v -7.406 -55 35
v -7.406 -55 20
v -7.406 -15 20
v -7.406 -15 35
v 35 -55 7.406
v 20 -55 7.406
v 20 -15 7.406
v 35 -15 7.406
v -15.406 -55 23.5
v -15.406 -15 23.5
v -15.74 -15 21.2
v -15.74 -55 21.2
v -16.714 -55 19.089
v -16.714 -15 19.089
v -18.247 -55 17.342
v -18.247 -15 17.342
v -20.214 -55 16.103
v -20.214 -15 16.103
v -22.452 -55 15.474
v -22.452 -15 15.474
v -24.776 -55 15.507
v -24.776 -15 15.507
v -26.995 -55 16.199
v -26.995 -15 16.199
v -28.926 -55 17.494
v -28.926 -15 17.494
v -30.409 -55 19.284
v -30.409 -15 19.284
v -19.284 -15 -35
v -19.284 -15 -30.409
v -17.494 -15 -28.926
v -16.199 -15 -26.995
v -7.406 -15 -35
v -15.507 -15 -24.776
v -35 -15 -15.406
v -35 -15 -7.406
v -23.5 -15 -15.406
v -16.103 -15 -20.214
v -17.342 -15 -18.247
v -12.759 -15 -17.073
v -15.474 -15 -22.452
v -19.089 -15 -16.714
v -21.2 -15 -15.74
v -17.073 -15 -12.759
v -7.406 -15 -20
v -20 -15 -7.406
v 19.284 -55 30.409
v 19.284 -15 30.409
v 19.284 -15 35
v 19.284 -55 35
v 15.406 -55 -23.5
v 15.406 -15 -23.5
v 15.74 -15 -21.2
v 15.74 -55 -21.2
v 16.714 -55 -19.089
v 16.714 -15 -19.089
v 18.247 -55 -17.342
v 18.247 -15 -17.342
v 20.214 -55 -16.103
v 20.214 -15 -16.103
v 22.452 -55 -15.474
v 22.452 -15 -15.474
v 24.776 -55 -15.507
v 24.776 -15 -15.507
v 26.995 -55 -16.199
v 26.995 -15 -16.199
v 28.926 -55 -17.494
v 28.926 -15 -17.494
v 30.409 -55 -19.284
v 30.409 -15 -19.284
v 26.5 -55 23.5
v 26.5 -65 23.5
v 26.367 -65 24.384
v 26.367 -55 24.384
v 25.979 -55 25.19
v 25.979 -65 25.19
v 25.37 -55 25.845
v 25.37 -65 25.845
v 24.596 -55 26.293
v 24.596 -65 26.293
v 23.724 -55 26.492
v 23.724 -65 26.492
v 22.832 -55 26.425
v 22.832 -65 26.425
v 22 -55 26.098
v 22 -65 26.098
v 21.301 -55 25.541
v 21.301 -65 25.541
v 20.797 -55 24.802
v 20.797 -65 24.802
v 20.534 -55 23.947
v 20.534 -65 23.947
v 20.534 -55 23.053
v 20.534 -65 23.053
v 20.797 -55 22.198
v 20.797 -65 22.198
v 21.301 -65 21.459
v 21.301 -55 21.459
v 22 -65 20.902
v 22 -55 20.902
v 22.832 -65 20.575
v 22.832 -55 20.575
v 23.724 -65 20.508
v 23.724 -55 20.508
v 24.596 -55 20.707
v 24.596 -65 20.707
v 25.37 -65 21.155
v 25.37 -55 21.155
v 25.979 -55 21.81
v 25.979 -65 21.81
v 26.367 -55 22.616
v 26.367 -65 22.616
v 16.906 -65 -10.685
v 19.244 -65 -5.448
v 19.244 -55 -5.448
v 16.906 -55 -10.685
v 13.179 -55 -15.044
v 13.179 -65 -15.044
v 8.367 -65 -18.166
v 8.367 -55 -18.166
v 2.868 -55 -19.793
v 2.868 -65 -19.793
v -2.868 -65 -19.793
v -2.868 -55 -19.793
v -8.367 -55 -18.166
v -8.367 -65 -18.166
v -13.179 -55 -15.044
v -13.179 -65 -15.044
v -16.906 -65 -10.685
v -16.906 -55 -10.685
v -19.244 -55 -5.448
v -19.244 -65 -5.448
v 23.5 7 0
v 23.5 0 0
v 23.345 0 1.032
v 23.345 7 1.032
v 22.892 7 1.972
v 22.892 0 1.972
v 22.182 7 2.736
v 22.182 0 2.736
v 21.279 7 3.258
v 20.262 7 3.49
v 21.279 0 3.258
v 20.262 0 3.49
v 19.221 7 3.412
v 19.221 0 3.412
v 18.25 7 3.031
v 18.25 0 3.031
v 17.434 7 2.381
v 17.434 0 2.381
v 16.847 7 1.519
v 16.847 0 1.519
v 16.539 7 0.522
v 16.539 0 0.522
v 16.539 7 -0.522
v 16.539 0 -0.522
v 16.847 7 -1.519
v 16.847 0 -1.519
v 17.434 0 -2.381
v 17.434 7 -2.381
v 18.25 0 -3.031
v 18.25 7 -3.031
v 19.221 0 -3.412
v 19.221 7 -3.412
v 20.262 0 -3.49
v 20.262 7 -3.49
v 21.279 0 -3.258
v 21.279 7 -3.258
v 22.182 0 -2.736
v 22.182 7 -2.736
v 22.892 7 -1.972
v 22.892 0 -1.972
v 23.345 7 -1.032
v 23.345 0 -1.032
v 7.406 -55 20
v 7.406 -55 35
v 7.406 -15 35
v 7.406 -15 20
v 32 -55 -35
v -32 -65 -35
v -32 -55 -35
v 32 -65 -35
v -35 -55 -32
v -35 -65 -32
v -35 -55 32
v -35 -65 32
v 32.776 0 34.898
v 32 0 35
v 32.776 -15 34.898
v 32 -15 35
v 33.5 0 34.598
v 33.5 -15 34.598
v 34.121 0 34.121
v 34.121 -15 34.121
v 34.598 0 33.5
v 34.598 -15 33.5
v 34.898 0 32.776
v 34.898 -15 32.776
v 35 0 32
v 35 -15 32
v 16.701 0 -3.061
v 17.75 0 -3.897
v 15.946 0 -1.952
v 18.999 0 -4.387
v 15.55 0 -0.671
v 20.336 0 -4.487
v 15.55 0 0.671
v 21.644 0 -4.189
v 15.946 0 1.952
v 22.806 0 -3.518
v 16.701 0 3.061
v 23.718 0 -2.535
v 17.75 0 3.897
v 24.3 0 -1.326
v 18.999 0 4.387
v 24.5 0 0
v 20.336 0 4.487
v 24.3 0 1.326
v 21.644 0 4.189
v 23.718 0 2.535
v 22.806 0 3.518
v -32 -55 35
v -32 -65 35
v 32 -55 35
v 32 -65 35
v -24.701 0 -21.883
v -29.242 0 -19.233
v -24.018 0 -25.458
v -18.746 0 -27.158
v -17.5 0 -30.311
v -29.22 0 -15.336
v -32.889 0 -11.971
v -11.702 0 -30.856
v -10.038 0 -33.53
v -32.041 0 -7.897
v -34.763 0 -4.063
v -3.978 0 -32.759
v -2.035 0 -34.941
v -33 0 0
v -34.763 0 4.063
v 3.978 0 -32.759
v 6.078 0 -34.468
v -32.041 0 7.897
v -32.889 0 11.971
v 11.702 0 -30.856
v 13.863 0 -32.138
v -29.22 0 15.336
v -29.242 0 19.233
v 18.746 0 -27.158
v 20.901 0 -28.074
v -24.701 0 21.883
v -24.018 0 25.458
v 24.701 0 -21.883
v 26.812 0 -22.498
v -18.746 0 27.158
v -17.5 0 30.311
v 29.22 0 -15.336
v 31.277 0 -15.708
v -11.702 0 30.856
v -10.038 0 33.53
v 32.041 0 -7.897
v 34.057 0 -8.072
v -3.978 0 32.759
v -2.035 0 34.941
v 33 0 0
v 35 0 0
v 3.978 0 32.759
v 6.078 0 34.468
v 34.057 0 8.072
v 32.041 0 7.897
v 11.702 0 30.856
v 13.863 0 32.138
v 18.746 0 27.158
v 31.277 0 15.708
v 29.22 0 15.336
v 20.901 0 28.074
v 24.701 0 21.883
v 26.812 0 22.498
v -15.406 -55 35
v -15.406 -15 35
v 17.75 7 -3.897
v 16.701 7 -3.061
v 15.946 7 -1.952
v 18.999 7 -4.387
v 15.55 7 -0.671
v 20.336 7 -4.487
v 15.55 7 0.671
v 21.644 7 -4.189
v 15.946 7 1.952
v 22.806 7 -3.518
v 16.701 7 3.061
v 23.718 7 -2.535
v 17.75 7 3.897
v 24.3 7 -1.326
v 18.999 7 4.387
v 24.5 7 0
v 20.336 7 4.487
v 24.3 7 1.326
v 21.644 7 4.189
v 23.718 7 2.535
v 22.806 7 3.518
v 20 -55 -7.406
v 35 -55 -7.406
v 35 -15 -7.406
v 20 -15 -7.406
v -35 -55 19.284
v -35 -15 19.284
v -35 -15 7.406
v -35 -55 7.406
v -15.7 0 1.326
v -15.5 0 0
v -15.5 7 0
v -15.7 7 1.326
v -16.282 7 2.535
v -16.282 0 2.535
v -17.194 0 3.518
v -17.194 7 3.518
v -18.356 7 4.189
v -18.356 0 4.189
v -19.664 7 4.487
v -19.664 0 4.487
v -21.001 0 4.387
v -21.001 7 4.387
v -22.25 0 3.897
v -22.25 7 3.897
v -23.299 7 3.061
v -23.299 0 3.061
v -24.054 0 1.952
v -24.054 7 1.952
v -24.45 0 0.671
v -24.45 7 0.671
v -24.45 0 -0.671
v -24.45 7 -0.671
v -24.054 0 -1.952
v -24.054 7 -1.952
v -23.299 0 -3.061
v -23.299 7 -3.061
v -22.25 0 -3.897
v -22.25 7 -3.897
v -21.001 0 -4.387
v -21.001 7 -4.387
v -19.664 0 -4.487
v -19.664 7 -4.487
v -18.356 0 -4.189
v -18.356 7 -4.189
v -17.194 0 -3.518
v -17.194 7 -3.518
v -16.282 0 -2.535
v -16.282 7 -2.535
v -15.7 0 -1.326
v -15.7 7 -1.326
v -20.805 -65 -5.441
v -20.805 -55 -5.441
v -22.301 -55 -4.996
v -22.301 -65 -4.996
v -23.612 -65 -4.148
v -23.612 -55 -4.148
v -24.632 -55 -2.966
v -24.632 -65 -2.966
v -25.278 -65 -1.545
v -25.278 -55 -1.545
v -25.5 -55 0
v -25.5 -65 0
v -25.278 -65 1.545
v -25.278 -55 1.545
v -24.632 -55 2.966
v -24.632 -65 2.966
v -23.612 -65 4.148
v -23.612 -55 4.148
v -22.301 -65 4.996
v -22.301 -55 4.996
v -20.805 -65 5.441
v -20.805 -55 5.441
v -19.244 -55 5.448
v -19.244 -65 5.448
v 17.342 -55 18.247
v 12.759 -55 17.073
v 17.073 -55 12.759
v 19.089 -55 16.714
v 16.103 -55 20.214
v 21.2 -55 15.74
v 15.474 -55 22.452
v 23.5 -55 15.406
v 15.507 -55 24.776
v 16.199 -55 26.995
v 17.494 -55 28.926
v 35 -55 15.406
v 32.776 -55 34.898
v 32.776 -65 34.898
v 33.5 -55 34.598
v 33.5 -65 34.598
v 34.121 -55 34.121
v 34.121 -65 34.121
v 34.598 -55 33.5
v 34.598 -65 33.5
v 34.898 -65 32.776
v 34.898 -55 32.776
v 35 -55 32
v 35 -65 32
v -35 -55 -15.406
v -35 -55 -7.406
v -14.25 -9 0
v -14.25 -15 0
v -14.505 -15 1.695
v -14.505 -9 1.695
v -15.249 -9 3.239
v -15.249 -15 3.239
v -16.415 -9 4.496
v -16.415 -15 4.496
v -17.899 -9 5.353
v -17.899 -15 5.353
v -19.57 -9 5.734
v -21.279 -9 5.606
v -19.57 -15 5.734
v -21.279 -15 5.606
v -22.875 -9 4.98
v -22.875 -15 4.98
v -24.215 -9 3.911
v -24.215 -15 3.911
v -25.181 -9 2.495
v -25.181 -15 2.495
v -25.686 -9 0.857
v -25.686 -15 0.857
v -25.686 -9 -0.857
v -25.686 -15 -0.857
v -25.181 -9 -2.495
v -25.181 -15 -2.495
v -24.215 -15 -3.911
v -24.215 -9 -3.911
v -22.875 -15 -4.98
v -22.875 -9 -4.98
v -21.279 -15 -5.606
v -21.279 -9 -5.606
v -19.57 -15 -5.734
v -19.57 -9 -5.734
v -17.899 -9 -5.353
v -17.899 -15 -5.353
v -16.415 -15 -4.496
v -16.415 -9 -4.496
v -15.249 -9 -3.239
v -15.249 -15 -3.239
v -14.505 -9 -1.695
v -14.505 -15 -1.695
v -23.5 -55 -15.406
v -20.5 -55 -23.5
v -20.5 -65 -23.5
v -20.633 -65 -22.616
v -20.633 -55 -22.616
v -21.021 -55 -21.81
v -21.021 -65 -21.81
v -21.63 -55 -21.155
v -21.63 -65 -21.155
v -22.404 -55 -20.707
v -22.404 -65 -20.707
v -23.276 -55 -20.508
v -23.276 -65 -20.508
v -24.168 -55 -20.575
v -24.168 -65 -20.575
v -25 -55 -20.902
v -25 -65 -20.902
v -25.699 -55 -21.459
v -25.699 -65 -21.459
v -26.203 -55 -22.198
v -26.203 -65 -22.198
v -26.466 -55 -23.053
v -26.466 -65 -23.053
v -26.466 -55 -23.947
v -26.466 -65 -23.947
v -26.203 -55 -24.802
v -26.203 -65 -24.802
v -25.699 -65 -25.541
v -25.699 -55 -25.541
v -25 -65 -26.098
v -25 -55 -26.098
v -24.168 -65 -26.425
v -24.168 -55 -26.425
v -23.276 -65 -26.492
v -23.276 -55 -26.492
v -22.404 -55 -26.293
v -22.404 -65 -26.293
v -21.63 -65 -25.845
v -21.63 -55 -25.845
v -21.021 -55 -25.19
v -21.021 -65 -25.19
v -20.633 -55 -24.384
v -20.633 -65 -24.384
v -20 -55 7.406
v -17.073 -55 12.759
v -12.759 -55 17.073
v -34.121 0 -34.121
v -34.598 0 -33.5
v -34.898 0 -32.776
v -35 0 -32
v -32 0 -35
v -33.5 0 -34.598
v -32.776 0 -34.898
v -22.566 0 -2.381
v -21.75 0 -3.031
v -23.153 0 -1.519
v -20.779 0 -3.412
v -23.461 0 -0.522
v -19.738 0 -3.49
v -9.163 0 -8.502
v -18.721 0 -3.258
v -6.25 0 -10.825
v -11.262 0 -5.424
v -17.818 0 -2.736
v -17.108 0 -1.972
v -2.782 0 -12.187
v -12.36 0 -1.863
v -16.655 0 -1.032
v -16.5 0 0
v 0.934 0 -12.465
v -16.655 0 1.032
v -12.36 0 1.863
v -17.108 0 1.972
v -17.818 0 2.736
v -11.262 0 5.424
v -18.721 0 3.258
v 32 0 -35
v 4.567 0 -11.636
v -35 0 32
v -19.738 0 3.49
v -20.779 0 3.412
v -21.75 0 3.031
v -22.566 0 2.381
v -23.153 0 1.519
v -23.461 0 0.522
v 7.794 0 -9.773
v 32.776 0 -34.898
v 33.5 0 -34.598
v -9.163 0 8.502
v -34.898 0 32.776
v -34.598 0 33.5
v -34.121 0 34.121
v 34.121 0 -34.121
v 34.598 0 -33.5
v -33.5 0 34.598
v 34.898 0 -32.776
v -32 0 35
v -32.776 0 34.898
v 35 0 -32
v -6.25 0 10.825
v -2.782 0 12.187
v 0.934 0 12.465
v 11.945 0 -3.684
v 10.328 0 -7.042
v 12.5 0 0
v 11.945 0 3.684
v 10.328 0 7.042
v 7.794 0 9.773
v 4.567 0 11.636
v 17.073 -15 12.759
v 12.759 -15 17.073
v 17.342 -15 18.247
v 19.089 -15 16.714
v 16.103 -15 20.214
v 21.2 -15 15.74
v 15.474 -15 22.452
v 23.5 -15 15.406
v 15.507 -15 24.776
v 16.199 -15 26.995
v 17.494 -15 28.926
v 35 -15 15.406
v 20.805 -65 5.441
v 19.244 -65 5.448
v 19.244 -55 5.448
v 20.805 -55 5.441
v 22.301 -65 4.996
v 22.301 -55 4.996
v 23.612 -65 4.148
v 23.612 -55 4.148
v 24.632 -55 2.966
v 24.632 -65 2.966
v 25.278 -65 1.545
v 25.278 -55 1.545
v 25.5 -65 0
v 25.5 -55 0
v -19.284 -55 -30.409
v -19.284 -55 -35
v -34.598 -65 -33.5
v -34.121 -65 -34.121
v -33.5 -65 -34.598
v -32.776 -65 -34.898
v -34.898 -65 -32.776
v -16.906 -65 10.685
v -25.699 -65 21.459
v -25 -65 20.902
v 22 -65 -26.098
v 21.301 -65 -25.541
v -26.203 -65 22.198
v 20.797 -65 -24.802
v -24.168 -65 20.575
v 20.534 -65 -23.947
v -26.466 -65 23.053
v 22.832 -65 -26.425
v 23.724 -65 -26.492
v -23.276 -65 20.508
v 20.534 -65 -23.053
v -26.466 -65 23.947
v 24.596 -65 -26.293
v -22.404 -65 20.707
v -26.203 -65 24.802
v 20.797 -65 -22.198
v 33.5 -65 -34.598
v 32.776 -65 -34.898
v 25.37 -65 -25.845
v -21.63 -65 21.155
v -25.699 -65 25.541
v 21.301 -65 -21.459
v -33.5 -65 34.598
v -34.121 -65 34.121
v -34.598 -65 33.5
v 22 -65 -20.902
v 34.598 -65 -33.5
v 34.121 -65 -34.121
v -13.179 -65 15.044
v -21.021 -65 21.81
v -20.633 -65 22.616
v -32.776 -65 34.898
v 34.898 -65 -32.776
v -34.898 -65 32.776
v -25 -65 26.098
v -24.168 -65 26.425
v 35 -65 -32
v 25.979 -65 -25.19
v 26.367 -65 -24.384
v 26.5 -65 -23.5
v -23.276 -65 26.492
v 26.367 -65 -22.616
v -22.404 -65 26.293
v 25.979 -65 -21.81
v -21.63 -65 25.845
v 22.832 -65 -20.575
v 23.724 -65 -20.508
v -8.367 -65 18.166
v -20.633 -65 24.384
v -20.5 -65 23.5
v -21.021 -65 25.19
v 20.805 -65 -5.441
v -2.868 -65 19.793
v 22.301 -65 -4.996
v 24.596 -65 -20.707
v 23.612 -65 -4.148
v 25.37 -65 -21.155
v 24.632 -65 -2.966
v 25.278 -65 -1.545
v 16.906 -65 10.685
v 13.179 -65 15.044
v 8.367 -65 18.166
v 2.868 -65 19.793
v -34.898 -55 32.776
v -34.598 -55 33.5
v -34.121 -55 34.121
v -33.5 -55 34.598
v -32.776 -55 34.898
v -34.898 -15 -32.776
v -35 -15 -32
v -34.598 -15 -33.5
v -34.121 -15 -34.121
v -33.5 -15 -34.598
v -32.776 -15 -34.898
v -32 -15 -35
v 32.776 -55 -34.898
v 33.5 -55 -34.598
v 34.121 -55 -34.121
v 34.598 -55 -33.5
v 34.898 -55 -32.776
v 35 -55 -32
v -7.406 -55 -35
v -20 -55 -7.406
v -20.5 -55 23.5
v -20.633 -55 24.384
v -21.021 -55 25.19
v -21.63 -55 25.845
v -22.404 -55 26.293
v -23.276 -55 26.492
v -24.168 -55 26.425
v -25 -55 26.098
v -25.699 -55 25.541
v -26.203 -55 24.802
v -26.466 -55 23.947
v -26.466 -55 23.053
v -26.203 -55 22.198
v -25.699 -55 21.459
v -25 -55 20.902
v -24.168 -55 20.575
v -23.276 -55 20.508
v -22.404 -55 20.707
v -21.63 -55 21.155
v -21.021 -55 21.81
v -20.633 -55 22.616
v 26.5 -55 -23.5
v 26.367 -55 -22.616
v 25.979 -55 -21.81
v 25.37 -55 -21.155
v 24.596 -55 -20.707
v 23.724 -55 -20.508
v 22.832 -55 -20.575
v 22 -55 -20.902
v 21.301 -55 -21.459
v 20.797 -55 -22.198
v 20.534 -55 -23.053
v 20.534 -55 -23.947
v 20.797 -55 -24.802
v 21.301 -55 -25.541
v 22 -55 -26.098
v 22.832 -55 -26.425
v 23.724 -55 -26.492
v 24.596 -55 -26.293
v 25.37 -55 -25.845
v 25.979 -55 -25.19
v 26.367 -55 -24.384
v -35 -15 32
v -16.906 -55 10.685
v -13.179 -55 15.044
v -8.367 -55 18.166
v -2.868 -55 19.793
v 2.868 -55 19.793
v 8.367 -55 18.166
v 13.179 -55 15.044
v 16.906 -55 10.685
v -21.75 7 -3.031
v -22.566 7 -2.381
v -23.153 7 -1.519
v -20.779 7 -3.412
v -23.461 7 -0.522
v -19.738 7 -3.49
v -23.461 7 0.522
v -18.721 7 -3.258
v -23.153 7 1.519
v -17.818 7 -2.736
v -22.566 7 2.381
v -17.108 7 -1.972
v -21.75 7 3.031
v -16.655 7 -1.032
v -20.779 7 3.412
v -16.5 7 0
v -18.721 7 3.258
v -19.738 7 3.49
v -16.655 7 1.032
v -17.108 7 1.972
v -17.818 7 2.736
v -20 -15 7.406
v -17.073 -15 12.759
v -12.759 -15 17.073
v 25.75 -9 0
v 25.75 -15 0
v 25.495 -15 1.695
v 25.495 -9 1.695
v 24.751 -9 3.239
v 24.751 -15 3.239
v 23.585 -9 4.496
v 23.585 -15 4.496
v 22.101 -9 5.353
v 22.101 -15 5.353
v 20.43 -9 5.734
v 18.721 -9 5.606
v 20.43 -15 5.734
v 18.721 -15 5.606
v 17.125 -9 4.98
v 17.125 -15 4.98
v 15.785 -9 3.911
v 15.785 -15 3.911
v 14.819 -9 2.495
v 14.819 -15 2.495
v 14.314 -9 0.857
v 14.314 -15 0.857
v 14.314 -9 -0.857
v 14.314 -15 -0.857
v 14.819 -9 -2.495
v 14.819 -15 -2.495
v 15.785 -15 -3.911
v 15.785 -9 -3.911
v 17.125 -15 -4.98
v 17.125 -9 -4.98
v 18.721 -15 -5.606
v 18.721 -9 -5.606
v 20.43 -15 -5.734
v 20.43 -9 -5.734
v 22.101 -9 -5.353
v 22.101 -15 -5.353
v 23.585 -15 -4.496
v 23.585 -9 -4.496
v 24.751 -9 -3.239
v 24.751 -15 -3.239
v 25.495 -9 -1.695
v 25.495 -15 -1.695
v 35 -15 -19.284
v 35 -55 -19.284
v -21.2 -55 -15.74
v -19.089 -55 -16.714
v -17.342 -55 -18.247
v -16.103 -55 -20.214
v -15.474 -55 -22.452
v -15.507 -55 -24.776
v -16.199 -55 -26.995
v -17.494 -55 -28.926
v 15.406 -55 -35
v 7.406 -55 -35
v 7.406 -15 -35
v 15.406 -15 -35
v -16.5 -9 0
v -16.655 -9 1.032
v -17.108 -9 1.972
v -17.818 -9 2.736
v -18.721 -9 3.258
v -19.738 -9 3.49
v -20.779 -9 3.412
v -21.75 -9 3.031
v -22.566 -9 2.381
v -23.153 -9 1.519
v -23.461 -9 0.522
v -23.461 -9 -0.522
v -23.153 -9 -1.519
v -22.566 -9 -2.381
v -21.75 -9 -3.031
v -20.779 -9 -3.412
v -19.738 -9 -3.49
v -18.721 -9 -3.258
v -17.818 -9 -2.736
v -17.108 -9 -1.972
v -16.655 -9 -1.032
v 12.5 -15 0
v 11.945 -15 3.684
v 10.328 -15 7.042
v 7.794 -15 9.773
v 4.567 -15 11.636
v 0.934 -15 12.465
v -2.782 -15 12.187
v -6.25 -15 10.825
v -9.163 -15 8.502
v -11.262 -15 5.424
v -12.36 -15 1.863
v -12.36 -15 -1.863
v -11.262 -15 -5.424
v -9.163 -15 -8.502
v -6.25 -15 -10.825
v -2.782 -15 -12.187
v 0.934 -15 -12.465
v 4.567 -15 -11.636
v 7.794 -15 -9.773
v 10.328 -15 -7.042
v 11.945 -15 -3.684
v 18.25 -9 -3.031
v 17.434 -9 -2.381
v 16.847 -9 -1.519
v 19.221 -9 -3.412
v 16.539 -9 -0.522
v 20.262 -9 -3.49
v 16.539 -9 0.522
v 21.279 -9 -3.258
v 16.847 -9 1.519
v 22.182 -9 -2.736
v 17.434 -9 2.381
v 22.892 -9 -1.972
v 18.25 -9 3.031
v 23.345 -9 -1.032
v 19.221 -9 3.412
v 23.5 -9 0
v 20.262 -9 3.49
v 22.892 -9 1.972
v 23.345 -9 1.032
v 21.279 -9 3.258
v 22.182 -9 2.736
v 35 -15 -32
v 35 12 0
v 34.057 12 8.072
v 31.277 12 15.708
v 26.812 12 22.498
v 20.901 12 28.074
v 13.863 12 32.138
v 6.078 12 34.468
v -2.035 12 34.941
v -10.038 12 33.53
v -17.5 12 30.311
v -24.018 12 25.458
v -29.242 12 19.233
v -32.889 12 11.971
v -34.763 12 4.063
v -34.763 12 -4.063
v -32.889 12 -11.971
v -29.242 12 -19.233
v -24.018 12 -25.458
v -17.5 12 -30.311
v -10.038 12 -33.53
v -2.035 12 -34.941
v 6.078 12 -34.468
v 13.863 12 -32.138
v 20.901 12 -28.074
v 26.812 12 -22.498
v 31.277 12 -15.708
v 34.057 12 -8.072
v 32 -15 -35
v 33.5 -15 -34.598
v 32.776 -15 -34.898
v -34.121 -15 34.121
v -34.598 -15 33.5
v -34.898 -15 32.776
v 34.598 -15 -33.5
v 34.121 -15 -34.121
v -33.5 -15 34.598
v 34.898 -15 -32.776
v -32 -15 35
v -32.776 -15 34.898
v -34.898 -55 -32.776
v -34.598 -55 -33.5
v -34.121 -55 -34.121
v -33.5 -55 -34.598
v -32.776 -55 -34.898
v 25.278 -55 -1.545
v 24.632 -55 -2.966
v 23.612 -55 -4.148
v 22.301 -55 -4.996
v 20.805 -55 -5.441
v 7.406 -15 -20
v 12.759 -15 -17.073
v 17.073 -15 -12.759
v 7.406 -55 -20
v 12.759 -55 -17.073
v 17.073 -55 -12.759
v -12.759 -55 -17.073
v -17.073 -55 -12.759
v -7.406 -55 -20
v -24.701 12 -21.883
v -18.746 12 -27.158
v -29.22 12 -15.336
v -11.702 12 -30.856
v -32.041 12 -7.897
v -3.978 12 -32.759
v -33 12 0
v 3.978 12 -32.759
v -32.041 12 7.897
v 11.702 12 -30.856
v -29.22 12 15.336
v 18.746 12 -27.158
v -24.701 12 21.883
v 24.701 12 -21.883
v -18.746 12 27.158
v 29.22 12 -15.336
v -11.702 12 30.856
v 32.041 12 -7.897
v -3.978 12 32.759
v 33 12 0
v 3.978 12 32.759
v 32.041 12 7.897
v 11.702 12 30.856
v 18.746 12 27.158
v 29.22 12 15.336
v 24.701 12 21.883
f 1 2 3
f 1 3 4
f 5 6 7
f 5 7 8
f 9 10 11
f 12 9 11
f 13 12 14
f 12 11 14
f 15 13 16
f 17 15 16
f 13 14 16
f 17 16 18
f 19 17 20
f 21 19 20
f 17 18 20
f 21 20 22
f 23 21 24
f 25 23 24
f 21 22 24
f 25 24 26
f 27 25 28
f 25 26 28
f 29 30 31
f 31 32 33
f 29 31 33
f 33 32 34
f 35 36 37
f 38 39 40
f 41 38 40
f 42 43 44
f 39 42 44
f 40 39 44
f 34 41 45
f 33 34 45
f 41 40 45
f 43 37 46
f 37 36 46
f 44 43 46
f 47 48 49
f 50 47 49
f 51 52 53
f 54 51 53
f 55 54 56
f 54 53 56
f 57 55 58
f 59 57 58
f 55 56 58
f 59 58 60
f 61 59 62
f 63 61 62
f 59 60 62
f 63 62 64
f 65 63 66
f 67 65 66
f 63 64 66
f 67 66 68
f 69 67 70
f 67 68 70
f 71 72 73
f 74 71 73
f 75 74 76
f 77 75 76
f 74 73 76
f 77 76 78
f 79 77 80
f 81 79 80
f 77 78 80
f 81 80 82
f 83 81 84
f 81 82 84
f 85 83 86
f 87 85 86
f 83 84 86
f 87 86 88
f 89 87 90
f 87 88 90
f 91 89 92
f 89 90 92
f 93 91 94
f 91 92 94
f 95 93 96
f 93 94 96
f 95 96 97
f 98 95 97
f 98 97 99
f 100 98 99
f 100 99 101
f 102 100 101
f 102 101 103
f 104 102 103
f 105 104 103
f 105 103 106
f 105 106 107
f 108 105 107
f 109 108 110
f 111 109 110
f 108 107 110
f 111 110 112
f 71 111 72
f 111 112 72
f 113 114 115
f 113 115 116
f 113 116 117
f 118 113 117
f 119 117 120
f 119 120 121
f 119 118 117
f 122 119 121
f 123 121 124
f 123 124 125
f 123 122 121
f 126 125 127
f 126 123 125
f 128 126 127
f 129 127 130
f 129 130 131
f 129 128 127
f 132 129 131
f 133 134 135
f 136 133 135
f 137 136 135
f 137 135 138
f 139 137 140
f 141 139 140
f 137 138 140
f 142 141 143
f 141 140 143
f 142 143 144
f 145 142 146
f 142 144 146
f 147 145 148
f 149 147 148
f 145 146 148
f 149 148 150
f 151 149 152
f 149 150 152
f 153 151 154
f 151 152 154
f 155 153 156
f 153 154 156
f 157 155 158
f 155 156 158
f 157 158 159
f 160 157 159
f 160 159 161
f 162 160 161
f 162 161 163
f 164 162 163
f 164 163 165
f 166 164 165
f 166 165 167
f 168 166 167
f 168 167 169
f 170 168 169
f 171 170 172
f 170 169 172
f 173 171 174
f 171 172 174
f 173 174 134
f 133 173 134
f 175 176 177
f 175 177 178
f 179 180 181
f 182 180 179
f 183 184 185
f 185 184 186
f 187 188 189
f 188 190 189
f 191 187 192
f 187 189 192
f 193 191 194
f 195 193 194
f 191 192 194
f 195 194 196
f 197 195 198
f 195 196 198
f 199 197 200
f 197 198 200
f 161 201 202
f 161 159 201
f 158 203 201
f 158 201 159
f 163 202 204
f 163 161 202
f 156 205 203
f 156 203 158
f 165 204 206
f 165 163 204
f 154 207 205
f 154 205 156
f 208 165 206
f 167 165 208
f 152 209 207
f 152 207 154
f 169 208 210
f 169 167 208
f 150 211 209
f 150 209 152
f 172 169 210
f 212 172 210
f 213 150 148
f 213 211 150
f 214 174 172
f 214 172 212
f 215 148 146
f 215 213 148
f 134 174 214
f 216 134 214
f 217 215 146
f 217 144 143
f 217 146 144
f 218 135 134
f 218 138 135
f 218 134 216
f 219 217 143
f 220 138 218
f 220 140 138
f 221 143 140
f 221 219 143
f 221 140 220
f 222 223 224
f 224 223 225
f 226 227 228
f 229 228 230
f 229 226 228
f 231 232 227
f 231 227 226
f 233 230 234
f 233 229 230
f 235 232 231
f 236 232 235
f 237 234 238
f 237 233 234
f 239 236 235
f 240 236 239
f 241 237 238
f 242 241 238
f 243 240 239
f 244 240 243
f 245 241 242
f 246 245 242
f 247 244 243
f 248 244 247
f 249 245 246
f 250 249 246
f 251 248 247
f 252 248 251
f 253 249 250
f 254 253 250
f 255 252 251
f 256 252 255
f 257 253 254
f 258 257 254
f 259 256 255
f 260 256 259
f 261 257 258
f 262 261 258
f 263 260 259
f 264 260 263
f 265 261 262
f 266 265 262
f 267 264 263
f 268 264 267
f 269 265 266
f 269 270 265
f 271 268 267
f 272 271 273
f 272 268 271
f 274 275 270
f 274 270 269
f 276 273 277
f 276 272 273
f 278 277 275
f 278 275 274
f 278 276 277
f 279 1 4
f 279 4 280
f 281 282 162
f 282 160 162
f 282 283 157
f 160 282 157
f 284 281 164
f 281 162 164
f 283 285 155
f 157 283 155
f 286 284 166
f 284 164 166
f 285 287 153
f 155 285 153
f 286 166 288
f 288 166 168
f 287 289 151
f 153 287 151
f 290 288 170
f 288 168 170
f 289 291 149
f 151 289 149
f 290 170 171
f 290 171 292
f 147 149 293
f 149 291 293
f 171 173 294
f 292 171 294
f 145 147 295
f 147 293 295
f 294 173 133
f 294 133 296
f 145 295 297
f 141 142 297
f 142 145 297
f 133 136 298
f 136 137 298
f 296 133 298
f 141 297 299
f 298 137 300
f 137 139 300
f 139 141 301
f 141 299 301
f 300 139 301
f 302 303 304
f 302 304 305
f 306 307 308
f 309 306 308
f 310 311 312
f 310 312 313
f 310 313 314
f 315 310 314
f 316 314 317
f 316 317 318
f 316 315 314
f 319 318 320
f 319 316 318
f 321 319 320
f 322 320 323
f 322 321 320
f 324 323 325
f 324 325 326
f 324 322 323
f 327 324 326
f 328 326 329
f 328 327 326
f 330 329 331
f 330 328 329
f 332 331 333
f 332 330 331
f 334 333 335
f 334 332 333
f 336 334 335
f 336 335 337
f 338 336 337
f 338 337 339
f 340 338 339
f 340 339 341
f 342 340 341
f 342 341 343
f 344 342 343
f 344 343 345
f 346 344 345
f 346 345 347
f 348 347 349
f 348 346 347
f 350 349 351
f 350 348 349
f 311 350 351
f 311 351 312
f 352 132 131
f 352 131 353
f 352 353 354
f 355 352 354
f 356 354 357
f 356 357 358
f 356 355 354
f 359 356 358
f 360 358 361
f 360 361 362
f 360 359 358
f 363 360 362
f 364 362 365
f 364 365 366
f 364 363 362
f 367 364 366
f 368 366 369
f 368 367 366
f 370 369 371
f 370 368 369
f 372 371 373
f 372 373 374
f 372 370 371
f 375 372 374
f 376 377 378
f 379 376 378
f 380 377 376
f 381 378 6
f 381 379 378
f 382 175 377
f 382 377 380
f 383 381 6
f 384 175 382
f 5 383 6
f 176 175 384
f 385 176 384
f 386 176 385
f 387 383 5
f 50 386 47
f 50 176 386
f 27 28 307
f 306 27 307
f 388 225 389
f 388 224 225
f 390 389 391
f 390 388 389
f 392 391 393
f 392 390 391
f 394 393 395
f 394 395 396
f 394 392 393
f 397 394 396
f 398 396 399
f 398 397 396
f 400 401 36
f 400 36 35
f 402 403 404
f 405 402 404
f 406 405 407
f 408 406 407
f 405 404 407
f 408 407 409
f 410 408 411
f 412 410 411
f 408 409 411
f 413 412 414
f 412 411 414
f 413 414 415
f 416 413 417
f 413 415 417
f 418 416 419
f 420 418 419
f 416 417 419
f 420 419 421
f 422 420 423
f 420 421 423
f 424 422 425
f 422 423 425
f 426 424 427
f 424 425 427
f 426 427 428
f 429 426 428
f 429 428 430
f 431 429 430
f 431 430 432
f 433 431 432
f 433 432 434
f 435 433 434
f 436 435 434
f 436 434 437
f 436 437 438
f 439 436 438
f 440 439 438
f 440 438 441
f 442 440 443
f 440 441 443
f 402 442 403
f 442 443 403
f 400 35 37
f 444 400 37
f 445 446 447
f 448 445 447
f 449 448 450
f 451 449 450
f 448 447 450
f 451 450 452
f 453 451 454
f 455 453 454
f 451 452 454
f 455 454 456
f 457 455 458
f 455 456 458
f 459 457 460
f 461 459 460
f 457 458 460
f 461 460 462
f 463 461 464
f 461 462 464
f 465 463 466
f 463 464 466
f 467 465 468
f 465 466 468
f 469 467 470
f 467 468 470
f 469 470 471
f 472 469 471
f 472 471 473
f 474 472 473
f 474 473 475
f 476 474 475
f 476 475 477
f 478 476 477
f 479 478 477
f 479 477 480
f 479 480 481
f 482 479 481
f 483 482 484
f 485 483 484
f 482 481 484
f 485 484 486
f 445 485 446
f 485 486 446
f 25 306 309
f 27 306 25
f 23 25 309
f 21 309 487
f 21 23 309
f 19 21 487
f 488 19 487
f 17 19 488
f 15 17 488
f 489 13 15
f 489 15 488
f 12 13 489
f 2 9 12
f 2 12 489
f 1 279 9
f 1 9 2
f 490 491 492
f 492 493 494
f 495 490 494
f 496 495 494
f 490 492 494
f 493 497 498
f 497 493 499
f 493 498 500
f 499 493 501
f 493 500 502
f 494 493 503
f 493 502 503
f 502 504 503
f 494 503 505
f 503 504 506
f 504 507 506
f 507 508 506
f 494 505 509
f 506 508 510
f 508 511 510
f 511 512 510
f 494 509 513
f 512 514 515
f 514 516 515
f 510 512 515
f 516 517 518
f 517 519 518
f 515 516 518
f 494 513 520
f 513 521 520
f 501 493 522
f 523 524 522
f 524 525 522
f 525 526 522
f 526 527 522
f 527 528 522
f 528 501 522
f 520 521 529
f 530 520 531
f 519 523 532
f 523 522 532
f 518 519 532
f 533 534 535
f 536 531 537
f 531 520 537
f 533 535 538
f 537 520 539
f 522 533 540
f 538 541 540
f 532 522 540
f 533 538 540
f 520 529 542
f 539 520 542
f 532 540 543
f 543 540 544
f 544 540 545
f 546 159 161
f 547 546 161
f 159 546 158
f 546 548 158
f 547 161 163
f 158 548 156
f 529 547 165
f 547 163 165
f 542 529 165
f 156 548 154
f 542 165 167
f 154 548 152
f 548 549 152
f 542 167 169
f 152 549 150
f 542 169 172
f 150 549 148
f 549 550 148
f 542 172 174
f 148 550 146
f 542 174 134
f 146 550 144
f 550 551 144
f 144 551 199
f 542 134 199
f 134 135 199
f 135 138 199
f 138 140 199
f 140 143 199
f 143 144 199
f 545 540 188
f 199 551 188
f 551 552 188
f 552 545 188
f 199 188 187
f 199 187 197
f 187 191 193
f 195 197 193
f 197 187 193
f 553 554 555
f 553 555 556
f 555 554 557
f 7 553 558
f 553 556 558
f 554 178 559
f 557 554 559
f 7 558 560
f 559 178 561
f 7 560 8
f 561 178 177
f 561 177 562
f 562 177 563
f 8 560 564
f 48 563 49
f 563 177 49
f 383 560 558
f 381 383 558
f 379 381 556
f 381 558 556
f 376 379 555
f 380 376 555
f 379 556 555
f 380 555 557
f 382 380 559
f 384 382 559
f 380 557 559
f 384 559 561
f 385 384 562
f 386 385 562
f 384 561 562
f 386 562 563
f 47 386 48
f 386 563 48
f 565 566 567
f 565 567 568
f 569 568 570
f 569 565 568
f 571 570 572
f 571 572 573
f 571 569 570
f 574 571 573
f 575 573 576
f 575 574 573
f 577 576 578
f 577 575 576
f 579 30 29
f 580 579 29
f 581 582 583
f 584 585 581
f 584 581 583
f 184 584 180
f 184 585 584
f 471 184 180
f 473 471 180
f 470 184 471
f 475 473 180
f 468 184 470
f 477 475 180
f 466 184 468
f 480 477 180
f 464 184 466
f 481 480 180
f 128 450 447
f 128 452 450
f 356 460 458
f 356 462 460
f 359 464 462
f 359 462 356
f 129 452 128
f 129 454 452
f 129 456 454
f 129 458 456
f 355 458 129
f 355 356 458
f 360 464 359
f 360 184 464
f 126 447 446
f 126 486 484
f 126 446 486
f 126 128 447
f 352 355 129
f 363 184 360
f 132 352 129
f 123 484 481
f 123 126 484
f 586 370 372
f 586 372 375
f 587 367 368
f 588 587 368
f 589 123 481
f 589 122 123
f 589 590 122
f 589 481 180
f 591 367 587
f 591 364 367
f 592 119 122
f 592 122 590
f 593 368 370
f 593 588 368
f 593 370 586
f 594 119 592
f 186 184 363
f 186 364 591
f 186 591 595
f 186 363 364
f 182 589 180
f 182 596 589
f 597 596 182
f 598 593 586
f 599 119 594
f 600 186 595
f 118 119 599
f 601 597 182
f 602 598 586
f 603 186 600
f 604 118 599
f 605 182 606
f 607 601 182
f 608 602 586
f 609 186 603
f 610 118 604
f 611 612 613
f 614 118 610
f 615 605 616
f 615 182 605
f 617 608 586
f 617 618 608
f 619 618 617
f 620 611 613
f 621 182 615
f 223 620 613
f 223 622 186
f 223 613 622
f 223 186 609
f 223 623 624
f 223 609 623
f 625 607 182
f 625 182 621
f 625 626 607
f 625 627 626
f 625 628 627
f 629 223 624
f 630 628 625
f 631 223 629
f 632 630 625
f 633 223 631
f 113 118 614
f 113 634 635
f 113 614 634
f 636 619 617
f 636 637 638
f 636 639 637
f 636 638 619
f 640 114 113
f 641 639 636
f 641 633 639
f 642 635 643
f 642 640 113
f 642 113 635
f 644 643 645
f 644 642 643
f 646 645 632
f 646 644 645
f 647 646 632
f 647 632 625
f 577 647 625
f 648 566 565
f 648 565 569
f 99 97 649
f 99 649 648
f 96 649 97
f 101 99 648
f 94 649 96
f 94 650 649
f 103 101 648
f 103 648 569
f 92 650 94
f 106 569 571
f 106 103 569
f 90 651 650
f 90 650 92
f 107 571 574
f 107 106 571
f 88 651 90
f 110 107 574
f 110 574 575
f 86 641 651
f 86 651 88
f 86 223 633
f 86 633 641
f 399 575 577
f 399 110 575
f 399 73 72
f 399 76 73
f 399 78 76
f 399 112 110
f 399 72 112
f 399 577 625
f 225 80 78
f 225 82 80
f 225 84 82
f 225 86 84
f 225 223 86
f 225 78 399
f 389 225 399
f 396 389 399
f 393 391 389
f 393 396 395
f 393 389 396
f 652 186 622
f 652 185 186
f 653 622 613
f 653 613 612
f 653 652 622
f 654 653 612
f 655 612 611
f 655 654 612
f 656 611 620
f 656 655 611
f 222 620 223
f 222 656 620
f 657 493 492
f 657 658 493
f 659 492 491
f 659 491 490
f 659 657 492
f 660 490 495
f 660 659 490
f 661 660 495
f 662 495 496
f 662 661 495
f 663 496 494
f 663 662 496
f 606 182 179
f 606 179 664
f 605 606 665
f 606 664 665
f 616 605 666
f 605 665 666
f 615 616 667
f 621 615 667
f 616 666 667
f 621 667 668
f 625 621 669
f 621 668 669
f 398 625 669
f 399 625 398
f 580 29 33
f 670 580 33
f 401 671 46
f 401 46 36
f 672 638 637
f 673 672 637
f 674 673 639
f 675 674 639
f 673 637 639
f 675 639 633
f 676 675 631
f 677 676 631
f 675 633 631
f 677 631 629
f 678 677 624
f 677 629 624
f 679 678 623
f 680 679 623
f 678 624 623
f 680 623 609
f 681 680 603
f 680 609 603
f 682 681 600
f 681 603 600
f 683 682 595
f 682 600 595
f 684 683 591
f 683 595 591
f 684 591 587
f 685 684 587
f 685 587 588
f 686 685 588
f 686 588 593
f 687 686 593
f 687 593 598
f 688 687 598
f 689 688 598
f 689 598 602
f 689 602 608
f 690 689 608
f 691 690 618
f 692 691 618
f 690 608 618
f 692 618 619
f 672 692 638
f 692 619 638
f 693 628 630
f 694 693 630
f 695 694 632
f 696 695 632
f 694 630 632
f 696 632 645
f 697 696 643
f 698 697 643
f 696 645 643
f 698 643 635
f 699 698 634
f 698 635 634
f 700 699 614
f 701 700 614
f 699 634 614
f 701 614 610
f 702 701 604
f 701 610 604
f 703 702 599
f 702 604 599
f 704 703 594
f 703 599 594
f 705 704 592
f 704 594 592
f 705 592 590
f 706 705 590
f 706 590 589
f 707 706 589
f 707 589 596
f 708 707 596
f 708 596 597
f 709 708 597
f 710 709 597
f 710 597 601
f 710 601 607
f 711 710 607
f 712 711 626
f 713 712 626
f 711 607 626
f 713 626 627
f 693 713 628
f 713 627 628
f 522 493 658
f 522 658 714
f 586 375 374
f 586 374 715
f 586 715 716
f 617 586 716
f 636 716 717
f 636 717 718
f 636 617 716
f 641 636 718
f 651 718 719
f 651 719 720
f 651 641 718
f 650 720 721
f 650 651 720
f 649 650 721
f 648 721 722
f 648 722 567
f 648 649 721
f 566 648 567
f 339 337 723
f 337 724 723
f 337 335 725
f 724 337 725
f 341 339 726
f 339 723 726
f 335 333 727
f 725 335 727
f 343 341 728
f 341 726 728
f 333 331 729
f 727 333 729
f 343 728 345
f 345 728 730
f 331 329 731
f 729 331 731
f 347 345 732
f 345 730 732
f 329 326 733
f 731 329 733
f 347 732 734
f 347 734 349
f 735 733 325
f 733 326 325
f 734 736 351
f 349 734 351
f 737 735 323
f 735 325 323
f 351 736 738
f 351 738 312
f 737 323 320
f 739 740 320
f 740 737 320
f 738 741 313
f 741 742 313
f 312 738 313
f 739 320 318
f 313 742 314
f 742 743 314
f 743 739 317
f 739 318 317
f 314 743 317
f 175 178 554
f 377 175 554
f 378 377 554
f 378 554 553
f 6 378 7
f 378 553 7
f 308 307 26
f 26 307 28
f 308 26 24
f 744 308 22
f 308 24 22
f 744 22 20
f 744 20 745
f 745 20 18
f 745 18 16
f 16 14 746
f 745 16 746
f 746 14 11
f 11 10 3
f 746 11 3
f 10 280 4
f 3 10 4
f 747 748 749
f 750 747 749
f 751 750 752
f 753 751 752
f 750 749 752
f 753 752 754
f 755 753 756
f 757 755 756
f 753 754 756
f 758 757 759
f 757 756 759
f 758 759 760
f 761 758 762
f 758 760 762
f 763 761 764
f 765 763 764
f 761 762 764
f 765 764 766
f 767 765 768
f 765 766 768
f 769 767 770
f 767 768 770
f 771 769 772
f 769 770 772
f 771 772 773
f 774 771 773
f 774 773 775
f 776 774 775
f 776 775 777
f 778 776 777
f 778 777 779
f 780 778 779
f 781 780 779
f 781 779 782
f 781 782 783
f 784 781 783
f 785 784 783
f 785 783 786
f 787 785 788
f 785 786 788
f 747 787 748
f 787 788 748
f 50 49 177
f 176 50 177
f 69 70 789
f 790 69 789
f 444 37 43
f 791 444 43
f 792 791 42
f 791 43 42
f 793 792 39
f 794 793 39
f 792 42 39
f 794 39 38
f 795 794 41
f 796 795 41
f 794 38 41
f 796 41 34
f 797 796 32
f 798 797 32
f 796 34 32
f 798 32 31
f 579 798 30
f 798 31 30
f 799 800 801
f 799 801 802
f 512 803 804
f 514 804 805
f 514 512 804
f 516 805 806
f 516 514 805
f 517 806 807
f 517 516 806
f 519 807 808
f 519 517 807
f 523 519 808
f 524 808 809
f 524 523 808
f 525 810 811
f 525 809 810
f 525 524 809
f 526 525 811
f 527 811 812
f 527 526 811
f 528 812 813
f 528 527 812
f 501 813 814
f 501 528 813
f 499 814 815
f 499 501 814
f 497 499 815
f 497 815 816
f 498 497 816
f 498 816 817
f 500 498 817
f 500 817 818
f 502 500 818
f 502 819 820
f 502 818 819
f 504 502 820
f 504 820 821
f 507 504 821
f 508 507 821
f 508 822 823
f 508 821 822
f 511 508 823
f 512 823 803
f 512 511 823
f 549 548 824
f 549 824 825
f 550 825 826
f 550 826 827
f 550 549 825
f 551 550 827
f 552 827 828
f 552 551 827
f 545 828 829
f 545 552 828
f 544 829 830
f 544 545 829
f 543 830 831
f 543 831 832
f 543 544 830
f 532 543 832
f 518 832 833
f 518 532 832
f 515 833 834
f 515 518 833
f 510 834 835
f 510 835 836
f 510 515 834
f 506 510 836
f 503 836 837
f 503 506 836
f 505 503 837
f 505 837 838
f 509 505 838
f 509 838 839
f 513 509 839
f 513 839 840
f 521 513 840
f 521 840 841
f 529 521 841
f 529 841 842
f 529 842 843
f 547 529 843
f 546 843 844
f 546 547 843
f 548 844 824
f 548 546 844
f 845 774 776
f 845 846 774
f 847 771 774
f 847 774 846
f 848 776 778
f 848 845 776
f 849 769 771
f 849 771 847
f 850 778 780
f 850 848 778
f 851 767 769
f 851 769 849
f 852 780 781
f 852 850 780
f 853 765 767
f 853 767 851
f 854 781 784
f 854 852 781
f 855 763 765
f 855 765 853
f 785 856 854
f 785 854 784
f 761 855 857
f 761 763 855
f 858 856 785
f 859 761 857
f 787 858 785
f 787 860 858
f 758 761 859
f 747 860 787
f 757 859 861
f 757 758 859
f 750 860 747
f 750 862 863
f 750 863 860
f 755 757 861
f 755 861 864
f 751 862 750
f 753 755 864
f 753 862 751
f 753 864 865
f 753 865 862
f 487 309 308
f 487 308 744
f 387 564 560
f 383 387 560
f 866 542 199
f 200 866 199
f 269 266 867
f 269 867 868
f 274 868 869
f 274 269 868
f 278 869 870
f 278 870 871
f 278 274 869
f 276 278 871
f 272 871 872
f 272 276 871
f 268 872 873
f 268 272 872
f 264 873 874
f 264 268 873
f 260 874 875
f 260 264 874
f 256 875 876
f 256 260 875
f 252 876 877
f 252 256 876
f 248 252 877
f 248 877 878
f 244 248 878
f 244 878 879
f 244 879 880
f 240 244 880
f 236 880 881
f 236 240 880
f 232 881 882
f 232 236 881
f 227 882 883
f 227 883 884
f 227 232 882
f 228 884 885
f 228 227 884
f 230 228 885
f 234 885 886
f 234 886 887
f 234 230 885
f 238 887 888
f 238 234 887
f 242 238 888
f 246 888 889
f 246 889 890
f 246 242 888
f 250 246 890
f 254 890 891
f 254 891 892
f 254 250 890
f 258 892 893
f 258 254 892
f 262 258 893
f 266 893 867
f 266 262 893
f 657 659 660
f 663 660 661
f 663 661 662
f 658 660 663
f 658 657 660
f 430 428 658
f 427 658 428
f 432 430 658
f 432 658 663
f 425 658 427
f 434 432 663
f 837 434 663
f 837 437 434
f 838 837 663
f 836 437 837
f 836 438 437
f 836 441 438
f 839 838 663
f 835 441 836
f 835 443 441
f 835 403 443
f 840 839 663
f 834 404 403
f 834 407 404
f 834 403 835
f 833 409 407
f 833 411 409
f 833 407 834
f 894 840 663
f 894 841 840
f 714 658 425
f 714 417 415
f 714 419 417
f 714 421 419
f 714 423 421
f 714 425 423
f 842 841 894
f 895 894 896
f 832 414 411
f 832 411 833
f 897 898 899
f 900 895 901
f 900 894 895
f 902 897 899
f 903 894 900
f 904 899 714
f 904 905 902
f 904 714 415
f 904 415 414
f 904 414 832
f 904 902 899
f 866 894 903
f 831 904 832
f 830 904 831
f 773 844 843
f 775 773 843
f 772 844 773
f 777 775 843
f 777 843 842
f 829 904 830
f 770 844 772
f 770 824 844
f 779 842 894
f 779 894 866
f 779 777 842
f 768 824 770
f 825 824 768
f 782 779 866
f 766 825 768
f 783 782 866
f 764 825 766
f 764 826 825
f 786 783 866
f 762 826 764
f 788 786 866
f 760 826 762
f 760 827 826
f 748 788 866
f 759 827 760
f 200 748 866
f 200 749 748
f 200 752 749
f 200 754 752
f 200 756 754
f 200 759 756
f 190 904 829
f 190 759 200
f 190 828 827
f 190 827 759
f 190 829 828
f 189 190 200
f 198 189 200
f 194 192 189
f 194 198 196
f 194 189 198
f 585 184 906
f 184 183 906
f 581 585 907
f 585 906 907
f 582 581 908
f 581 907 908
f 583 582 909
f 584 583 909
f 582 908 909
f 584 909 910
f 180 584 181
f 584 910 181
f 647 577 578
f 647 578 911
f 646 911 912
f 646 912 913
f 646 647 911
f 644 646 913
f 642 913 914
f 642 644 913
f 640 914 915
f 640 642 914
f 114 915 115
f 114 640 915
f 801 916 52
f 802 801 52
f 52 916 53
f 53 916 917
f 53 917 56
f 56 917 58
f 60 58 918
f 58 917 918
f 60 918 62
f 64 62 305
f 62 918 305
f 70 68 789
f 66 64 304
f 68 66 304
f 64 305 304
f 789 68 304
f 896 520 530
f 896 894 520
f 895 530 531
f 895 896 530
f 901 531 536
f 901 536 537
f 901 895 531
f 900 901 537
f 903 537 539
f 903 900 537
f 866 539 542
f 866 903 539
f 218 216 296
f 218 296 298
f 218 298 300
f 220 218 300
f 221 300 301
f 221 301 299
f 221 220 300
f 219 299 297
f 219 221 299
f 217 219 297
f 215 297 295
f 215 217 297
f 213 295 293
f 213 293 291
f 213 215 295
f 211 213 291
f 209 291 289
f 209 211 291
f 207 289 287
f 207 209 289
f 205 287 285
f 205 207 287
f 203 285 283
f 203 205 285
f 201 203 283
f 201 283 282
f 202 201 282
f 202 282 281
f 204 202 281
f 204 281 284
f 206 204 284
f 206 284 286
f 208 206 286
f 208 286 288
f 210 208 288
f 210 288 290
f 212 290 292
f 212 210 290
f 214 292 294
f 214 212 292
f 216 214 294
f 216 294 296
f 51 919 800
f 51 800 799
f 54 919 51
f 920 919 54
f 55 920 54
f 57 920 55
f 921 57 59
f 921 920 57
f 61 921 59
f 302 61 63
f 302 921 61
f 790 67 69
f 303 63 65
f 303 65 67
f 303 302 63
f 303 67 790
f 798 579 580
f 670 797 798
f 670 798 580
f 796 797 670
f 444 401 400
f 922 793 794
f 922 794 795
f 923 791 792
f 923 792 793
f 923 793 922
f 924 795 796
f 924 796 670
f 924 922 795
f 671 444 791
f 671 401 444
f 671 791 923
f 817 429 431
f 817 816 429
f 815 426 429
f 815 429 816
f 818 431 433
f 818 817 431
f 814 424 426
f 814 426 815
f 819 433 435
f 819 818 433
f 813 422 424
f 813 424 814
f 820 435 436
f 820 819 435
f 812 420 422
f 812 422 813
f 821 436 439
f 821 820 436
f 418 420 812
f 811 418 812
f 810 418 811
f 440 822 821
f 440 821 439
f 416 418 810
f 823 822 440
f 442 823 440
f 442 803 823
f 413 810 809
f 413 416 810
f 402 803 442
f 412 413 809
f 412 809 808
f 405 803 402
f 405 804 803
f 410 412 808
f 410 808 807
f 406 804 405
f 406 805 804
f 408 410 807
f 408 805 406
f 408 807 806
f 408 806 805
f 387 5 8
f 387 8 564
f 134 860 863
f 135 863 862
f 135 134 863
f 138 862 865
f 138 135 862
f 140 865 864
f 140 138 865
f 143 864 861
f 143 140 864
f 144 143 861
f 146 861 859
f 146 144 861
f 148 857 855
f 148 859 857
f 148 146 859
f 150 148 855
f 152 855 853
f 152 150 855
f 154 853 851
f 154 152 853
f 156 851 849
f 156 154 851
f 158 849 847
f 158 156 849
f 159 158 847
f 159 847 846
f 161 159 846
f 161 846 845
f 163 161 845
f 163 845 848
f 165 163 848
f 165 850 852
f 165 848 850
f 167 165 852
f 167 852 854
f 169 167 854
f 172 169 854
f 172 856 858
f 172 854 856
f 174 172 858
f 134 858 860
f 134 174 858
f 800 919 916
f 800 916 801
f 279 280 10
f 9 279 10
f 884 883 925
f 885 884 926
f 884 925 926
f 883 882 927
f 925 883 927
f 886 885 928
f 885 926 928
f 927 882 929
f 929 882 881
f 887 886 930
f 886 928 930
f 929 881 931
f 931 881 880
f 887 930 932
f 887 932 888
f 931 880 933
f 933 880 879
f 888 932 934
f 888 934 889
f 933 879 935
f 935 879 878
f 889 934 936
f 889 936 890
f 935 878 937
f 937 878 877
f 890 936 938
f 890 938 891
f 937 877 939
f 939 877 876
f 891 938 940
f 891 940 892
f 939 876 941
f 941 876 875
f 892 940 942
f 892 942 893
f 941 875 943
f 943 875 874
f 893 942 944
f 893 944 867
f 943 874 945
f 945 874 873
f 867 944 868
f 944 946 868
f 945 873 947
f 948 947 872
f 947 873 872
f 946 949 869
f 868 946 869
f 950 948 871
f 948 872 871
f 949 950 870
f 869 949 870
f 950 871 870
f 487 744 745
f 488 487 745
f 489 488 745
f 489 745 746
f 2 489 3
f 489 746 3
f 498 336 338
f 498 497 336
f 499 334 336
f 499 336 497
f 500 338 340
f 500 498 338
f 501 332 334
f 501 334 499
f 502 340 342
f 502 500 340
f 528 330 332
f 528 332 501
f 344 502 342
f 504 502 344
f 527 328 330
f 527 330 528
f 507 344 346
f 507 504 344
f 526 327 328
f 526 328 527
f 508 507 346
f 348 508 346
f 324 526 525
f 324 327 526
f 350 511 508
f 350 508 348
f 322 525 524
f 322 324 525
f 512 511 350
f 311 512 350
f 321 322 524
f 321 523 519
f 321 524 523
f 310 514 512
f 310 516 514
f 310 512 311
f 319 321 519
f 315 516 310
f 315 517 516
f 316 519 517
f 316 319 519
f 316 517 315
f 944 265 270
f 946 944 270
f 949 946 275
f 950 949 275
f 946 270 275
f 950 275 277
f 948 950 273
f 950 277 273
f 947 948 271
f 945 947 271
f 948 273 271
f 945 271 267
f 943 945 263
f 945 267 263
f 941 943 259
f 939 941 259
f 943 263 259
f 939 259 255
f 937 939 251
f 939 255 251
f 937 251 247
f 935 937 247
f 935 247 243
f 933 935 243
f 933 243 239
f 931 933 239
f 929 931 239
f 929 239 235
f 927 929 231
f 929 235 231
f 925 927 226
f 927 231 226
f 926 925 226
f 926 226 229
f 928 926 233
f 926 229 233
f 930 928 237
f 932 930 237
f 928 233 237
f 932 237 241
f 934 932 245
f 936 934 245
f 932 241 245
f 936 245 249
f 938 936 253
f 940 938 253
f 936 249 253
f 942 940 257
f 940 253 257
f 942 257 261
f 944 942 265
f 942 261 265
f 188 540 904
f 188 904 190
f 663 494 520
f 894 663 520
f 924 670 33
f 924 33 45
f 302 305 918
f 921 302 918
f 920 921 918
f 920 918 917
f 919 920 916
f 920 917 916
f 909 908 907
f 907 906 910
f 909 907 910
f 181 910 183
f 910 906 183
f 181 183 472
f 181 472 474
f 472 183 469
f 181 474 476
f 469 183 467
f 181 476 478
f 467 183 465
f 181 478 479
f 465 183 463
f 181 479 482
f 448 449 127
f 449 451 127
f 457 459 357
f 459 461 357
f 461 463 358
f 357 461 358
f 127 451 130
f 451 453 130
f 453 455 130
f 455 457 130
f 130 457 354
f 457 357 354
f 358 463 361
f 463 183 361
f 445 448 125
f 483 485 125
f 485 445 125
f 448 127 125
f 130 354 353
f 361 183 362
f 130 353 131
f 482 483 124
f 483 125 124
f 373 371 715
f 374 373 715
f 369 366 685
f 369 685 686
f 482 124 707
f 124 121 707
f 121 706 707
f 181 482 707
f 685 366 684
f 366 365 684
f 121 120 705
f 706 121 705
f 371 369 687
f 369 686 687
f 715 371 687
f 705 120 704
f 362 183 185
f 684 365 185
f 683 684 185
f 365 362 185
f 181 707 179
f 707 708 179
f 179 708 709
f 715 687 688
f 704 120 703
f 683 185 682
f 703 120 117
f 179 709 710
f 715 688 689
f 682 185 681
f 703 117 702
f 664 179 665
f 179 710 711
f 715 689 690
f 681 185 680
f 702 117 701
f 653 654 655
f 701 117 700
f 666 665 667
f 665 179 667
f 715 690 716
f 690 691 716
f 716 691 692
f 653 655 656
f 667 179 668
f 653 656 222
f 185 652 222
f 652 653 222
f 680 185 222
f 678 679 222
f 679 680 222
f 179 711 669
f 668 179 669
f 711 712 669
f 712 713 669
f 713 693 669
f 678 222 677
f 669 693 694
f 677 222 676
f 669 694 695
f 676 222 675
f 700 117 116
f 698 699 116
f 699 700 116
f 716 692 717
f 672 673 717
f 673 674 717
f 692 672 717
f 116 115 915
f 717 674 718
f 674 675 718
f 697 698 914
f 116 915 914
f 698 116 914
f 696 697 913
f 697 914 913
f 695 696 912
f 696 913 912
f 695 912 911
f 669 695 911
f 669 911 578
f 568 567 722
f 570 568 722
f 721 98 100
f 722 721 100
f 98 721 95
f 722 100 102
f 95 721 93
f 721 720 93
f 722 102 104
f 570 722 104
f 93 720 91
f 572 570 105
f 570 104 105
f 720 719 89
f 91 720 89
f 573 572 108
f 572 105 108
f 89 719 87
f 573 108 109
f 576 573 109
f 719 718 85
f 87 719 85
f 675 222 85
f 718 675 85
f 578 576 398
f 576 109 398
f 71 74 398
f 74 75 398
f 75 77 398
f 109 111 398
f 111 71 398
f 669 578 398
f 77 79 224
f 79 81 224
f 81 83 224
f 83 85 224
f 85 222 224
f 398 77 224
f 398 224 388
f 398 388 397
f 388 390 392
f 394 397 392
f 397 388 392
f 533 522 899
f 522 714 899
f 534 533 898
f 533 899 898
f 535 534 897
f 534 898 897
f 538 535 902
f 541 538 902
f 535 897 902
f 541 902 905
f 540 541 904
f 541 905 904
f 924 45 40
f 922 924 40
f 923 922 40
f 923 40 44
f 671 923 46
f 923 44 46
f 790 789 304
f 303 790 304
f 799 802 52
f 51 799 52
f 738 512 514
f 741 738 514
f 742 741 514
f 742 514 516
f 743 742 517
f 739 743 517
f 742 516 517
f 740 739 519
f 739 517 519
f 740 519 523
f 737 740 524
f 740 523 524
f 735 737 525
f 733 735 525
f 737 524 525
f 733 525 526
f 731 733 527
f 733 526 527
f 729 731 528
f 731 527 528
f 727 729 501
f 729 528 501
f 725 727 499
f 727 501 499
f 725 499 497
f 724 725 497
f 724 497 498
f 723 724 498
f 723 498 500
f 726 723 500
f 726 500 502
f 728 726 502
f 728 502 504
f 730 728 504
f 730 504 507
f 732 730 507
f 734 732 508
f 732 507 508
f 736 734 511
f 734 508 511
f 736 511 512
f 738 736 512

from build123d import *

# Parameters (mm, degrees)
F0_R      = 4.5
F0_R_2    = 3.5
F1_DEPTH  = 7
F2_R      = 35
F2_R_2    = 33
F3_DEPTH  = 12
F4_W      = 70
F4_H      = 70
F4_R      = 3.5
F4_R_2    = 12.5
F5_DEPTH  = 15
F7_R      = 5.75
F8_DEPTH  = 6
F10_W     = 70
F10_H     = 70
F10_R     = 3
F11_DEPTH = 10
F13_DEPTH = 40
F14_R     = 3
F15_R     = 3


with BuildPart() as f1:
    # F0 (on Front) → F1 (new body)
    with BuildSketch(Plane.XZ):
        with Locations((-20, 0)):
            Circle(F0_R)
        with Locations((-20, 0)):
            Circle(F0_R_2, mode=Mode.SUBTRACT)
        with Locations((20, 0)):
            Circle(F0_R)
        with Locations((20, 0)):
            Circle(F0_R_2, mode=Mode.SUBTRACT)
    extrude(amount=-F1_DEPTH)


with BuildPart() as f3:
    # F2 (on Front) → F3 (new body)
    with BuildSketch(Plane.XZ):
        Circle(F2_R)
        Circle(F2_R_2, mode=Mode.SUBTRACT)
    extrude(amount=-F3_DEPTH)


with BuildPart() as f5:
    # F4 (on Front) → F5 (new body)
    with BuildSketch(Plane.XZ):
        Rectangle(F4_W, F4_H)
        with Locations((-20, 0)):
            Circle(F4_R, mode=Mode.SUBTRACT)
        Circle(F4_R_2, mode=Mode.SUBTRACT)
        with Locations((20, 0)):
            Circle(F4_R, mode=Mode.SUBTRACT)
    extrude(amount=F5_DEPTH)

    # F7 (on offset) → F8 (cut)
    with BuildSketch(Plane.XZ.offset(15)):
        with Locations((-20, 0)):
            Circle(F7_R)
        with Locations((20, 0)):
            Circle(F7_R)
    extrude(amount=-F8_DEPTH, mode=Mode.SUBTRACT)

    # F15
    f15_edges = [f5.edges().sort_by_distance(p)[0] for p in [
        (35, -7.5, -35),
        (35, -7.5, 35),
        (-35, -7.5, 35),
        (-35, -7.5, -35),
    ]]
    fillet(f15_edges, radius=F15_R)


with BuildPart() as f11:
    # F10 (on offset) → F11 (new body)
    with BuildSketch(Plane.XZ.offset(65)):
        Rectangle(F10_W, F10_H)
        with Locations((-23.5, -23.5)):
            Circle(F10_R, mode=Mode.SUBTRACT)
        with Locations((23.5, -23.5)):
            Circle(F10_R, mode=Mode.SUBTRACT)
        with Locations((-23.5, 23.5)):
            Circle(F10_R, mode=Mode.SUBTRACT)
        with BuildLine():
            ThreePointArc((-19.24375, 5.44776), (0, 20), (19.24375, 5.44776))
            ThreePointArc((19.24375, 5.44776), (23.61183, 4.147853), (25.5, 0))
            ThreePointArc((25.5, 0), (23.61183, -4.147853), (19.24375, -5.44776))
            ThreePointArc((19.24375, -5.44776), (0, -20), (-19.24375, -5.44776))
            ThreePointArc((-19.24375, -5.44776), (-25.5, 0), (-19.24375, 5.44776))
        make_face(mode=Mode.SUBTRACT)
        with Locations((23.5, 23.5)):
            Circle(F10_R, mode=Mode.SUBTRACT)
    extrude(amount=-F11_DEPTH)

    # F14
    f14_edges = [f11.edges().sort_by_distance(p)[0] for p in [
        (-35, -60, 35),
        (35, -60, 35),
        (35, -60, -35),
        (-35, -60, -35),
    ]]
    fillet(f14_edges, radius=F14_R)


with BuildPart() as f13:
    # F12 (on offset) → F13 (new body)
    with BuildSketch(Plane.XZ.offset(15)):
        with BuildLine():
            Line((-15.405996, 35), (-15.405996, 23.5))
            ThreePointArc((-15.405996, 23.5), (-21.310088, 15.707876), (-30.409, 19.283529))
            Line((-30.409, 19.283529), (-35, 19.283529))
            Line((-35, 19.283529), (-35.000031, 7.406))
            Line((-35.000031, 7.406), (-20.000031, 7.406))
            ThreePointArc((-20.000031, 7.406), (-15.069489, 15.06948), (-7.405996, 20))
            Line((-7.405996, 20), (-7.405996, 35))
            Line((-7.405996, 35), (-15.405996, 35))
        make_face()
        with BuildLine():
            Line((-20, -7.405996), (-35, -7.405996))
            Line((-35, -7.405996), (-35, -15.405996))
            Line((-35, -15.405996), (-23.5, -15.405996))
            ThreePointArc((-23.5, -15.405996), (-15.707876, -21.310088), (-19.283529, -30.409))
            Line((-19.283529, -30.409), (-19.283529, -35))
            Line((-19.283529, -35), (-7.406, -35.000031))
            Line((-7.406, -35.000031), (-7.406, -20.000031))
            ThreePointArc((-7.406, -20.000031), (-15.06948, -15.069489), (-20, -7.405996))
        make_face()
        with BuildLine():
            Line((7.405996, -20), (7.405996, -35))
            Line((7.405996, -35), (15.405996, -35))
            Line((15.405996, -35), (15.405996, -23.5))
            ThreePointArc((15.405996, -23.5), (21.310088, -15.707876), (30.409, -19.283529))
            Line((30.409, -19.283529), (35, -19.283529))
            Line((35, -19.283529), (35.000031, -7.406))
            Line((35.000031, -7.406), (20.000031, -7.406))
            ThreePointArc((20.000031, -7.406), (15.069489, -15.06948), (7.405996, -20))
        make_face()
        with BuildLine():
            Line((20, 7.405996), (35, 7.405996))
            Line((35, 7.405996), (35, 15.405996))
            Line((35, 15.405996), (23.5, 15.405996))
            ThreePointArc((23.5, 15.405996), (15.707876, 21.310088), (19.283529, 30.409))
            Line((19.283529, 30.409), (19.283529, 35))
            Line((19.283529, 35), (7.406, 35.000031))
            Line((7.406, 35.000031), (7.406, 20.000031))
            ThreePointArc((7.406, 20.000031), (15.06948, 15.069489), (20, 7.405996))
        make_face()
    extrude(amount=F13_DEPTH)


solid = Compound([f1.part, f3.part, f5.part, f11.part, f13.part])
